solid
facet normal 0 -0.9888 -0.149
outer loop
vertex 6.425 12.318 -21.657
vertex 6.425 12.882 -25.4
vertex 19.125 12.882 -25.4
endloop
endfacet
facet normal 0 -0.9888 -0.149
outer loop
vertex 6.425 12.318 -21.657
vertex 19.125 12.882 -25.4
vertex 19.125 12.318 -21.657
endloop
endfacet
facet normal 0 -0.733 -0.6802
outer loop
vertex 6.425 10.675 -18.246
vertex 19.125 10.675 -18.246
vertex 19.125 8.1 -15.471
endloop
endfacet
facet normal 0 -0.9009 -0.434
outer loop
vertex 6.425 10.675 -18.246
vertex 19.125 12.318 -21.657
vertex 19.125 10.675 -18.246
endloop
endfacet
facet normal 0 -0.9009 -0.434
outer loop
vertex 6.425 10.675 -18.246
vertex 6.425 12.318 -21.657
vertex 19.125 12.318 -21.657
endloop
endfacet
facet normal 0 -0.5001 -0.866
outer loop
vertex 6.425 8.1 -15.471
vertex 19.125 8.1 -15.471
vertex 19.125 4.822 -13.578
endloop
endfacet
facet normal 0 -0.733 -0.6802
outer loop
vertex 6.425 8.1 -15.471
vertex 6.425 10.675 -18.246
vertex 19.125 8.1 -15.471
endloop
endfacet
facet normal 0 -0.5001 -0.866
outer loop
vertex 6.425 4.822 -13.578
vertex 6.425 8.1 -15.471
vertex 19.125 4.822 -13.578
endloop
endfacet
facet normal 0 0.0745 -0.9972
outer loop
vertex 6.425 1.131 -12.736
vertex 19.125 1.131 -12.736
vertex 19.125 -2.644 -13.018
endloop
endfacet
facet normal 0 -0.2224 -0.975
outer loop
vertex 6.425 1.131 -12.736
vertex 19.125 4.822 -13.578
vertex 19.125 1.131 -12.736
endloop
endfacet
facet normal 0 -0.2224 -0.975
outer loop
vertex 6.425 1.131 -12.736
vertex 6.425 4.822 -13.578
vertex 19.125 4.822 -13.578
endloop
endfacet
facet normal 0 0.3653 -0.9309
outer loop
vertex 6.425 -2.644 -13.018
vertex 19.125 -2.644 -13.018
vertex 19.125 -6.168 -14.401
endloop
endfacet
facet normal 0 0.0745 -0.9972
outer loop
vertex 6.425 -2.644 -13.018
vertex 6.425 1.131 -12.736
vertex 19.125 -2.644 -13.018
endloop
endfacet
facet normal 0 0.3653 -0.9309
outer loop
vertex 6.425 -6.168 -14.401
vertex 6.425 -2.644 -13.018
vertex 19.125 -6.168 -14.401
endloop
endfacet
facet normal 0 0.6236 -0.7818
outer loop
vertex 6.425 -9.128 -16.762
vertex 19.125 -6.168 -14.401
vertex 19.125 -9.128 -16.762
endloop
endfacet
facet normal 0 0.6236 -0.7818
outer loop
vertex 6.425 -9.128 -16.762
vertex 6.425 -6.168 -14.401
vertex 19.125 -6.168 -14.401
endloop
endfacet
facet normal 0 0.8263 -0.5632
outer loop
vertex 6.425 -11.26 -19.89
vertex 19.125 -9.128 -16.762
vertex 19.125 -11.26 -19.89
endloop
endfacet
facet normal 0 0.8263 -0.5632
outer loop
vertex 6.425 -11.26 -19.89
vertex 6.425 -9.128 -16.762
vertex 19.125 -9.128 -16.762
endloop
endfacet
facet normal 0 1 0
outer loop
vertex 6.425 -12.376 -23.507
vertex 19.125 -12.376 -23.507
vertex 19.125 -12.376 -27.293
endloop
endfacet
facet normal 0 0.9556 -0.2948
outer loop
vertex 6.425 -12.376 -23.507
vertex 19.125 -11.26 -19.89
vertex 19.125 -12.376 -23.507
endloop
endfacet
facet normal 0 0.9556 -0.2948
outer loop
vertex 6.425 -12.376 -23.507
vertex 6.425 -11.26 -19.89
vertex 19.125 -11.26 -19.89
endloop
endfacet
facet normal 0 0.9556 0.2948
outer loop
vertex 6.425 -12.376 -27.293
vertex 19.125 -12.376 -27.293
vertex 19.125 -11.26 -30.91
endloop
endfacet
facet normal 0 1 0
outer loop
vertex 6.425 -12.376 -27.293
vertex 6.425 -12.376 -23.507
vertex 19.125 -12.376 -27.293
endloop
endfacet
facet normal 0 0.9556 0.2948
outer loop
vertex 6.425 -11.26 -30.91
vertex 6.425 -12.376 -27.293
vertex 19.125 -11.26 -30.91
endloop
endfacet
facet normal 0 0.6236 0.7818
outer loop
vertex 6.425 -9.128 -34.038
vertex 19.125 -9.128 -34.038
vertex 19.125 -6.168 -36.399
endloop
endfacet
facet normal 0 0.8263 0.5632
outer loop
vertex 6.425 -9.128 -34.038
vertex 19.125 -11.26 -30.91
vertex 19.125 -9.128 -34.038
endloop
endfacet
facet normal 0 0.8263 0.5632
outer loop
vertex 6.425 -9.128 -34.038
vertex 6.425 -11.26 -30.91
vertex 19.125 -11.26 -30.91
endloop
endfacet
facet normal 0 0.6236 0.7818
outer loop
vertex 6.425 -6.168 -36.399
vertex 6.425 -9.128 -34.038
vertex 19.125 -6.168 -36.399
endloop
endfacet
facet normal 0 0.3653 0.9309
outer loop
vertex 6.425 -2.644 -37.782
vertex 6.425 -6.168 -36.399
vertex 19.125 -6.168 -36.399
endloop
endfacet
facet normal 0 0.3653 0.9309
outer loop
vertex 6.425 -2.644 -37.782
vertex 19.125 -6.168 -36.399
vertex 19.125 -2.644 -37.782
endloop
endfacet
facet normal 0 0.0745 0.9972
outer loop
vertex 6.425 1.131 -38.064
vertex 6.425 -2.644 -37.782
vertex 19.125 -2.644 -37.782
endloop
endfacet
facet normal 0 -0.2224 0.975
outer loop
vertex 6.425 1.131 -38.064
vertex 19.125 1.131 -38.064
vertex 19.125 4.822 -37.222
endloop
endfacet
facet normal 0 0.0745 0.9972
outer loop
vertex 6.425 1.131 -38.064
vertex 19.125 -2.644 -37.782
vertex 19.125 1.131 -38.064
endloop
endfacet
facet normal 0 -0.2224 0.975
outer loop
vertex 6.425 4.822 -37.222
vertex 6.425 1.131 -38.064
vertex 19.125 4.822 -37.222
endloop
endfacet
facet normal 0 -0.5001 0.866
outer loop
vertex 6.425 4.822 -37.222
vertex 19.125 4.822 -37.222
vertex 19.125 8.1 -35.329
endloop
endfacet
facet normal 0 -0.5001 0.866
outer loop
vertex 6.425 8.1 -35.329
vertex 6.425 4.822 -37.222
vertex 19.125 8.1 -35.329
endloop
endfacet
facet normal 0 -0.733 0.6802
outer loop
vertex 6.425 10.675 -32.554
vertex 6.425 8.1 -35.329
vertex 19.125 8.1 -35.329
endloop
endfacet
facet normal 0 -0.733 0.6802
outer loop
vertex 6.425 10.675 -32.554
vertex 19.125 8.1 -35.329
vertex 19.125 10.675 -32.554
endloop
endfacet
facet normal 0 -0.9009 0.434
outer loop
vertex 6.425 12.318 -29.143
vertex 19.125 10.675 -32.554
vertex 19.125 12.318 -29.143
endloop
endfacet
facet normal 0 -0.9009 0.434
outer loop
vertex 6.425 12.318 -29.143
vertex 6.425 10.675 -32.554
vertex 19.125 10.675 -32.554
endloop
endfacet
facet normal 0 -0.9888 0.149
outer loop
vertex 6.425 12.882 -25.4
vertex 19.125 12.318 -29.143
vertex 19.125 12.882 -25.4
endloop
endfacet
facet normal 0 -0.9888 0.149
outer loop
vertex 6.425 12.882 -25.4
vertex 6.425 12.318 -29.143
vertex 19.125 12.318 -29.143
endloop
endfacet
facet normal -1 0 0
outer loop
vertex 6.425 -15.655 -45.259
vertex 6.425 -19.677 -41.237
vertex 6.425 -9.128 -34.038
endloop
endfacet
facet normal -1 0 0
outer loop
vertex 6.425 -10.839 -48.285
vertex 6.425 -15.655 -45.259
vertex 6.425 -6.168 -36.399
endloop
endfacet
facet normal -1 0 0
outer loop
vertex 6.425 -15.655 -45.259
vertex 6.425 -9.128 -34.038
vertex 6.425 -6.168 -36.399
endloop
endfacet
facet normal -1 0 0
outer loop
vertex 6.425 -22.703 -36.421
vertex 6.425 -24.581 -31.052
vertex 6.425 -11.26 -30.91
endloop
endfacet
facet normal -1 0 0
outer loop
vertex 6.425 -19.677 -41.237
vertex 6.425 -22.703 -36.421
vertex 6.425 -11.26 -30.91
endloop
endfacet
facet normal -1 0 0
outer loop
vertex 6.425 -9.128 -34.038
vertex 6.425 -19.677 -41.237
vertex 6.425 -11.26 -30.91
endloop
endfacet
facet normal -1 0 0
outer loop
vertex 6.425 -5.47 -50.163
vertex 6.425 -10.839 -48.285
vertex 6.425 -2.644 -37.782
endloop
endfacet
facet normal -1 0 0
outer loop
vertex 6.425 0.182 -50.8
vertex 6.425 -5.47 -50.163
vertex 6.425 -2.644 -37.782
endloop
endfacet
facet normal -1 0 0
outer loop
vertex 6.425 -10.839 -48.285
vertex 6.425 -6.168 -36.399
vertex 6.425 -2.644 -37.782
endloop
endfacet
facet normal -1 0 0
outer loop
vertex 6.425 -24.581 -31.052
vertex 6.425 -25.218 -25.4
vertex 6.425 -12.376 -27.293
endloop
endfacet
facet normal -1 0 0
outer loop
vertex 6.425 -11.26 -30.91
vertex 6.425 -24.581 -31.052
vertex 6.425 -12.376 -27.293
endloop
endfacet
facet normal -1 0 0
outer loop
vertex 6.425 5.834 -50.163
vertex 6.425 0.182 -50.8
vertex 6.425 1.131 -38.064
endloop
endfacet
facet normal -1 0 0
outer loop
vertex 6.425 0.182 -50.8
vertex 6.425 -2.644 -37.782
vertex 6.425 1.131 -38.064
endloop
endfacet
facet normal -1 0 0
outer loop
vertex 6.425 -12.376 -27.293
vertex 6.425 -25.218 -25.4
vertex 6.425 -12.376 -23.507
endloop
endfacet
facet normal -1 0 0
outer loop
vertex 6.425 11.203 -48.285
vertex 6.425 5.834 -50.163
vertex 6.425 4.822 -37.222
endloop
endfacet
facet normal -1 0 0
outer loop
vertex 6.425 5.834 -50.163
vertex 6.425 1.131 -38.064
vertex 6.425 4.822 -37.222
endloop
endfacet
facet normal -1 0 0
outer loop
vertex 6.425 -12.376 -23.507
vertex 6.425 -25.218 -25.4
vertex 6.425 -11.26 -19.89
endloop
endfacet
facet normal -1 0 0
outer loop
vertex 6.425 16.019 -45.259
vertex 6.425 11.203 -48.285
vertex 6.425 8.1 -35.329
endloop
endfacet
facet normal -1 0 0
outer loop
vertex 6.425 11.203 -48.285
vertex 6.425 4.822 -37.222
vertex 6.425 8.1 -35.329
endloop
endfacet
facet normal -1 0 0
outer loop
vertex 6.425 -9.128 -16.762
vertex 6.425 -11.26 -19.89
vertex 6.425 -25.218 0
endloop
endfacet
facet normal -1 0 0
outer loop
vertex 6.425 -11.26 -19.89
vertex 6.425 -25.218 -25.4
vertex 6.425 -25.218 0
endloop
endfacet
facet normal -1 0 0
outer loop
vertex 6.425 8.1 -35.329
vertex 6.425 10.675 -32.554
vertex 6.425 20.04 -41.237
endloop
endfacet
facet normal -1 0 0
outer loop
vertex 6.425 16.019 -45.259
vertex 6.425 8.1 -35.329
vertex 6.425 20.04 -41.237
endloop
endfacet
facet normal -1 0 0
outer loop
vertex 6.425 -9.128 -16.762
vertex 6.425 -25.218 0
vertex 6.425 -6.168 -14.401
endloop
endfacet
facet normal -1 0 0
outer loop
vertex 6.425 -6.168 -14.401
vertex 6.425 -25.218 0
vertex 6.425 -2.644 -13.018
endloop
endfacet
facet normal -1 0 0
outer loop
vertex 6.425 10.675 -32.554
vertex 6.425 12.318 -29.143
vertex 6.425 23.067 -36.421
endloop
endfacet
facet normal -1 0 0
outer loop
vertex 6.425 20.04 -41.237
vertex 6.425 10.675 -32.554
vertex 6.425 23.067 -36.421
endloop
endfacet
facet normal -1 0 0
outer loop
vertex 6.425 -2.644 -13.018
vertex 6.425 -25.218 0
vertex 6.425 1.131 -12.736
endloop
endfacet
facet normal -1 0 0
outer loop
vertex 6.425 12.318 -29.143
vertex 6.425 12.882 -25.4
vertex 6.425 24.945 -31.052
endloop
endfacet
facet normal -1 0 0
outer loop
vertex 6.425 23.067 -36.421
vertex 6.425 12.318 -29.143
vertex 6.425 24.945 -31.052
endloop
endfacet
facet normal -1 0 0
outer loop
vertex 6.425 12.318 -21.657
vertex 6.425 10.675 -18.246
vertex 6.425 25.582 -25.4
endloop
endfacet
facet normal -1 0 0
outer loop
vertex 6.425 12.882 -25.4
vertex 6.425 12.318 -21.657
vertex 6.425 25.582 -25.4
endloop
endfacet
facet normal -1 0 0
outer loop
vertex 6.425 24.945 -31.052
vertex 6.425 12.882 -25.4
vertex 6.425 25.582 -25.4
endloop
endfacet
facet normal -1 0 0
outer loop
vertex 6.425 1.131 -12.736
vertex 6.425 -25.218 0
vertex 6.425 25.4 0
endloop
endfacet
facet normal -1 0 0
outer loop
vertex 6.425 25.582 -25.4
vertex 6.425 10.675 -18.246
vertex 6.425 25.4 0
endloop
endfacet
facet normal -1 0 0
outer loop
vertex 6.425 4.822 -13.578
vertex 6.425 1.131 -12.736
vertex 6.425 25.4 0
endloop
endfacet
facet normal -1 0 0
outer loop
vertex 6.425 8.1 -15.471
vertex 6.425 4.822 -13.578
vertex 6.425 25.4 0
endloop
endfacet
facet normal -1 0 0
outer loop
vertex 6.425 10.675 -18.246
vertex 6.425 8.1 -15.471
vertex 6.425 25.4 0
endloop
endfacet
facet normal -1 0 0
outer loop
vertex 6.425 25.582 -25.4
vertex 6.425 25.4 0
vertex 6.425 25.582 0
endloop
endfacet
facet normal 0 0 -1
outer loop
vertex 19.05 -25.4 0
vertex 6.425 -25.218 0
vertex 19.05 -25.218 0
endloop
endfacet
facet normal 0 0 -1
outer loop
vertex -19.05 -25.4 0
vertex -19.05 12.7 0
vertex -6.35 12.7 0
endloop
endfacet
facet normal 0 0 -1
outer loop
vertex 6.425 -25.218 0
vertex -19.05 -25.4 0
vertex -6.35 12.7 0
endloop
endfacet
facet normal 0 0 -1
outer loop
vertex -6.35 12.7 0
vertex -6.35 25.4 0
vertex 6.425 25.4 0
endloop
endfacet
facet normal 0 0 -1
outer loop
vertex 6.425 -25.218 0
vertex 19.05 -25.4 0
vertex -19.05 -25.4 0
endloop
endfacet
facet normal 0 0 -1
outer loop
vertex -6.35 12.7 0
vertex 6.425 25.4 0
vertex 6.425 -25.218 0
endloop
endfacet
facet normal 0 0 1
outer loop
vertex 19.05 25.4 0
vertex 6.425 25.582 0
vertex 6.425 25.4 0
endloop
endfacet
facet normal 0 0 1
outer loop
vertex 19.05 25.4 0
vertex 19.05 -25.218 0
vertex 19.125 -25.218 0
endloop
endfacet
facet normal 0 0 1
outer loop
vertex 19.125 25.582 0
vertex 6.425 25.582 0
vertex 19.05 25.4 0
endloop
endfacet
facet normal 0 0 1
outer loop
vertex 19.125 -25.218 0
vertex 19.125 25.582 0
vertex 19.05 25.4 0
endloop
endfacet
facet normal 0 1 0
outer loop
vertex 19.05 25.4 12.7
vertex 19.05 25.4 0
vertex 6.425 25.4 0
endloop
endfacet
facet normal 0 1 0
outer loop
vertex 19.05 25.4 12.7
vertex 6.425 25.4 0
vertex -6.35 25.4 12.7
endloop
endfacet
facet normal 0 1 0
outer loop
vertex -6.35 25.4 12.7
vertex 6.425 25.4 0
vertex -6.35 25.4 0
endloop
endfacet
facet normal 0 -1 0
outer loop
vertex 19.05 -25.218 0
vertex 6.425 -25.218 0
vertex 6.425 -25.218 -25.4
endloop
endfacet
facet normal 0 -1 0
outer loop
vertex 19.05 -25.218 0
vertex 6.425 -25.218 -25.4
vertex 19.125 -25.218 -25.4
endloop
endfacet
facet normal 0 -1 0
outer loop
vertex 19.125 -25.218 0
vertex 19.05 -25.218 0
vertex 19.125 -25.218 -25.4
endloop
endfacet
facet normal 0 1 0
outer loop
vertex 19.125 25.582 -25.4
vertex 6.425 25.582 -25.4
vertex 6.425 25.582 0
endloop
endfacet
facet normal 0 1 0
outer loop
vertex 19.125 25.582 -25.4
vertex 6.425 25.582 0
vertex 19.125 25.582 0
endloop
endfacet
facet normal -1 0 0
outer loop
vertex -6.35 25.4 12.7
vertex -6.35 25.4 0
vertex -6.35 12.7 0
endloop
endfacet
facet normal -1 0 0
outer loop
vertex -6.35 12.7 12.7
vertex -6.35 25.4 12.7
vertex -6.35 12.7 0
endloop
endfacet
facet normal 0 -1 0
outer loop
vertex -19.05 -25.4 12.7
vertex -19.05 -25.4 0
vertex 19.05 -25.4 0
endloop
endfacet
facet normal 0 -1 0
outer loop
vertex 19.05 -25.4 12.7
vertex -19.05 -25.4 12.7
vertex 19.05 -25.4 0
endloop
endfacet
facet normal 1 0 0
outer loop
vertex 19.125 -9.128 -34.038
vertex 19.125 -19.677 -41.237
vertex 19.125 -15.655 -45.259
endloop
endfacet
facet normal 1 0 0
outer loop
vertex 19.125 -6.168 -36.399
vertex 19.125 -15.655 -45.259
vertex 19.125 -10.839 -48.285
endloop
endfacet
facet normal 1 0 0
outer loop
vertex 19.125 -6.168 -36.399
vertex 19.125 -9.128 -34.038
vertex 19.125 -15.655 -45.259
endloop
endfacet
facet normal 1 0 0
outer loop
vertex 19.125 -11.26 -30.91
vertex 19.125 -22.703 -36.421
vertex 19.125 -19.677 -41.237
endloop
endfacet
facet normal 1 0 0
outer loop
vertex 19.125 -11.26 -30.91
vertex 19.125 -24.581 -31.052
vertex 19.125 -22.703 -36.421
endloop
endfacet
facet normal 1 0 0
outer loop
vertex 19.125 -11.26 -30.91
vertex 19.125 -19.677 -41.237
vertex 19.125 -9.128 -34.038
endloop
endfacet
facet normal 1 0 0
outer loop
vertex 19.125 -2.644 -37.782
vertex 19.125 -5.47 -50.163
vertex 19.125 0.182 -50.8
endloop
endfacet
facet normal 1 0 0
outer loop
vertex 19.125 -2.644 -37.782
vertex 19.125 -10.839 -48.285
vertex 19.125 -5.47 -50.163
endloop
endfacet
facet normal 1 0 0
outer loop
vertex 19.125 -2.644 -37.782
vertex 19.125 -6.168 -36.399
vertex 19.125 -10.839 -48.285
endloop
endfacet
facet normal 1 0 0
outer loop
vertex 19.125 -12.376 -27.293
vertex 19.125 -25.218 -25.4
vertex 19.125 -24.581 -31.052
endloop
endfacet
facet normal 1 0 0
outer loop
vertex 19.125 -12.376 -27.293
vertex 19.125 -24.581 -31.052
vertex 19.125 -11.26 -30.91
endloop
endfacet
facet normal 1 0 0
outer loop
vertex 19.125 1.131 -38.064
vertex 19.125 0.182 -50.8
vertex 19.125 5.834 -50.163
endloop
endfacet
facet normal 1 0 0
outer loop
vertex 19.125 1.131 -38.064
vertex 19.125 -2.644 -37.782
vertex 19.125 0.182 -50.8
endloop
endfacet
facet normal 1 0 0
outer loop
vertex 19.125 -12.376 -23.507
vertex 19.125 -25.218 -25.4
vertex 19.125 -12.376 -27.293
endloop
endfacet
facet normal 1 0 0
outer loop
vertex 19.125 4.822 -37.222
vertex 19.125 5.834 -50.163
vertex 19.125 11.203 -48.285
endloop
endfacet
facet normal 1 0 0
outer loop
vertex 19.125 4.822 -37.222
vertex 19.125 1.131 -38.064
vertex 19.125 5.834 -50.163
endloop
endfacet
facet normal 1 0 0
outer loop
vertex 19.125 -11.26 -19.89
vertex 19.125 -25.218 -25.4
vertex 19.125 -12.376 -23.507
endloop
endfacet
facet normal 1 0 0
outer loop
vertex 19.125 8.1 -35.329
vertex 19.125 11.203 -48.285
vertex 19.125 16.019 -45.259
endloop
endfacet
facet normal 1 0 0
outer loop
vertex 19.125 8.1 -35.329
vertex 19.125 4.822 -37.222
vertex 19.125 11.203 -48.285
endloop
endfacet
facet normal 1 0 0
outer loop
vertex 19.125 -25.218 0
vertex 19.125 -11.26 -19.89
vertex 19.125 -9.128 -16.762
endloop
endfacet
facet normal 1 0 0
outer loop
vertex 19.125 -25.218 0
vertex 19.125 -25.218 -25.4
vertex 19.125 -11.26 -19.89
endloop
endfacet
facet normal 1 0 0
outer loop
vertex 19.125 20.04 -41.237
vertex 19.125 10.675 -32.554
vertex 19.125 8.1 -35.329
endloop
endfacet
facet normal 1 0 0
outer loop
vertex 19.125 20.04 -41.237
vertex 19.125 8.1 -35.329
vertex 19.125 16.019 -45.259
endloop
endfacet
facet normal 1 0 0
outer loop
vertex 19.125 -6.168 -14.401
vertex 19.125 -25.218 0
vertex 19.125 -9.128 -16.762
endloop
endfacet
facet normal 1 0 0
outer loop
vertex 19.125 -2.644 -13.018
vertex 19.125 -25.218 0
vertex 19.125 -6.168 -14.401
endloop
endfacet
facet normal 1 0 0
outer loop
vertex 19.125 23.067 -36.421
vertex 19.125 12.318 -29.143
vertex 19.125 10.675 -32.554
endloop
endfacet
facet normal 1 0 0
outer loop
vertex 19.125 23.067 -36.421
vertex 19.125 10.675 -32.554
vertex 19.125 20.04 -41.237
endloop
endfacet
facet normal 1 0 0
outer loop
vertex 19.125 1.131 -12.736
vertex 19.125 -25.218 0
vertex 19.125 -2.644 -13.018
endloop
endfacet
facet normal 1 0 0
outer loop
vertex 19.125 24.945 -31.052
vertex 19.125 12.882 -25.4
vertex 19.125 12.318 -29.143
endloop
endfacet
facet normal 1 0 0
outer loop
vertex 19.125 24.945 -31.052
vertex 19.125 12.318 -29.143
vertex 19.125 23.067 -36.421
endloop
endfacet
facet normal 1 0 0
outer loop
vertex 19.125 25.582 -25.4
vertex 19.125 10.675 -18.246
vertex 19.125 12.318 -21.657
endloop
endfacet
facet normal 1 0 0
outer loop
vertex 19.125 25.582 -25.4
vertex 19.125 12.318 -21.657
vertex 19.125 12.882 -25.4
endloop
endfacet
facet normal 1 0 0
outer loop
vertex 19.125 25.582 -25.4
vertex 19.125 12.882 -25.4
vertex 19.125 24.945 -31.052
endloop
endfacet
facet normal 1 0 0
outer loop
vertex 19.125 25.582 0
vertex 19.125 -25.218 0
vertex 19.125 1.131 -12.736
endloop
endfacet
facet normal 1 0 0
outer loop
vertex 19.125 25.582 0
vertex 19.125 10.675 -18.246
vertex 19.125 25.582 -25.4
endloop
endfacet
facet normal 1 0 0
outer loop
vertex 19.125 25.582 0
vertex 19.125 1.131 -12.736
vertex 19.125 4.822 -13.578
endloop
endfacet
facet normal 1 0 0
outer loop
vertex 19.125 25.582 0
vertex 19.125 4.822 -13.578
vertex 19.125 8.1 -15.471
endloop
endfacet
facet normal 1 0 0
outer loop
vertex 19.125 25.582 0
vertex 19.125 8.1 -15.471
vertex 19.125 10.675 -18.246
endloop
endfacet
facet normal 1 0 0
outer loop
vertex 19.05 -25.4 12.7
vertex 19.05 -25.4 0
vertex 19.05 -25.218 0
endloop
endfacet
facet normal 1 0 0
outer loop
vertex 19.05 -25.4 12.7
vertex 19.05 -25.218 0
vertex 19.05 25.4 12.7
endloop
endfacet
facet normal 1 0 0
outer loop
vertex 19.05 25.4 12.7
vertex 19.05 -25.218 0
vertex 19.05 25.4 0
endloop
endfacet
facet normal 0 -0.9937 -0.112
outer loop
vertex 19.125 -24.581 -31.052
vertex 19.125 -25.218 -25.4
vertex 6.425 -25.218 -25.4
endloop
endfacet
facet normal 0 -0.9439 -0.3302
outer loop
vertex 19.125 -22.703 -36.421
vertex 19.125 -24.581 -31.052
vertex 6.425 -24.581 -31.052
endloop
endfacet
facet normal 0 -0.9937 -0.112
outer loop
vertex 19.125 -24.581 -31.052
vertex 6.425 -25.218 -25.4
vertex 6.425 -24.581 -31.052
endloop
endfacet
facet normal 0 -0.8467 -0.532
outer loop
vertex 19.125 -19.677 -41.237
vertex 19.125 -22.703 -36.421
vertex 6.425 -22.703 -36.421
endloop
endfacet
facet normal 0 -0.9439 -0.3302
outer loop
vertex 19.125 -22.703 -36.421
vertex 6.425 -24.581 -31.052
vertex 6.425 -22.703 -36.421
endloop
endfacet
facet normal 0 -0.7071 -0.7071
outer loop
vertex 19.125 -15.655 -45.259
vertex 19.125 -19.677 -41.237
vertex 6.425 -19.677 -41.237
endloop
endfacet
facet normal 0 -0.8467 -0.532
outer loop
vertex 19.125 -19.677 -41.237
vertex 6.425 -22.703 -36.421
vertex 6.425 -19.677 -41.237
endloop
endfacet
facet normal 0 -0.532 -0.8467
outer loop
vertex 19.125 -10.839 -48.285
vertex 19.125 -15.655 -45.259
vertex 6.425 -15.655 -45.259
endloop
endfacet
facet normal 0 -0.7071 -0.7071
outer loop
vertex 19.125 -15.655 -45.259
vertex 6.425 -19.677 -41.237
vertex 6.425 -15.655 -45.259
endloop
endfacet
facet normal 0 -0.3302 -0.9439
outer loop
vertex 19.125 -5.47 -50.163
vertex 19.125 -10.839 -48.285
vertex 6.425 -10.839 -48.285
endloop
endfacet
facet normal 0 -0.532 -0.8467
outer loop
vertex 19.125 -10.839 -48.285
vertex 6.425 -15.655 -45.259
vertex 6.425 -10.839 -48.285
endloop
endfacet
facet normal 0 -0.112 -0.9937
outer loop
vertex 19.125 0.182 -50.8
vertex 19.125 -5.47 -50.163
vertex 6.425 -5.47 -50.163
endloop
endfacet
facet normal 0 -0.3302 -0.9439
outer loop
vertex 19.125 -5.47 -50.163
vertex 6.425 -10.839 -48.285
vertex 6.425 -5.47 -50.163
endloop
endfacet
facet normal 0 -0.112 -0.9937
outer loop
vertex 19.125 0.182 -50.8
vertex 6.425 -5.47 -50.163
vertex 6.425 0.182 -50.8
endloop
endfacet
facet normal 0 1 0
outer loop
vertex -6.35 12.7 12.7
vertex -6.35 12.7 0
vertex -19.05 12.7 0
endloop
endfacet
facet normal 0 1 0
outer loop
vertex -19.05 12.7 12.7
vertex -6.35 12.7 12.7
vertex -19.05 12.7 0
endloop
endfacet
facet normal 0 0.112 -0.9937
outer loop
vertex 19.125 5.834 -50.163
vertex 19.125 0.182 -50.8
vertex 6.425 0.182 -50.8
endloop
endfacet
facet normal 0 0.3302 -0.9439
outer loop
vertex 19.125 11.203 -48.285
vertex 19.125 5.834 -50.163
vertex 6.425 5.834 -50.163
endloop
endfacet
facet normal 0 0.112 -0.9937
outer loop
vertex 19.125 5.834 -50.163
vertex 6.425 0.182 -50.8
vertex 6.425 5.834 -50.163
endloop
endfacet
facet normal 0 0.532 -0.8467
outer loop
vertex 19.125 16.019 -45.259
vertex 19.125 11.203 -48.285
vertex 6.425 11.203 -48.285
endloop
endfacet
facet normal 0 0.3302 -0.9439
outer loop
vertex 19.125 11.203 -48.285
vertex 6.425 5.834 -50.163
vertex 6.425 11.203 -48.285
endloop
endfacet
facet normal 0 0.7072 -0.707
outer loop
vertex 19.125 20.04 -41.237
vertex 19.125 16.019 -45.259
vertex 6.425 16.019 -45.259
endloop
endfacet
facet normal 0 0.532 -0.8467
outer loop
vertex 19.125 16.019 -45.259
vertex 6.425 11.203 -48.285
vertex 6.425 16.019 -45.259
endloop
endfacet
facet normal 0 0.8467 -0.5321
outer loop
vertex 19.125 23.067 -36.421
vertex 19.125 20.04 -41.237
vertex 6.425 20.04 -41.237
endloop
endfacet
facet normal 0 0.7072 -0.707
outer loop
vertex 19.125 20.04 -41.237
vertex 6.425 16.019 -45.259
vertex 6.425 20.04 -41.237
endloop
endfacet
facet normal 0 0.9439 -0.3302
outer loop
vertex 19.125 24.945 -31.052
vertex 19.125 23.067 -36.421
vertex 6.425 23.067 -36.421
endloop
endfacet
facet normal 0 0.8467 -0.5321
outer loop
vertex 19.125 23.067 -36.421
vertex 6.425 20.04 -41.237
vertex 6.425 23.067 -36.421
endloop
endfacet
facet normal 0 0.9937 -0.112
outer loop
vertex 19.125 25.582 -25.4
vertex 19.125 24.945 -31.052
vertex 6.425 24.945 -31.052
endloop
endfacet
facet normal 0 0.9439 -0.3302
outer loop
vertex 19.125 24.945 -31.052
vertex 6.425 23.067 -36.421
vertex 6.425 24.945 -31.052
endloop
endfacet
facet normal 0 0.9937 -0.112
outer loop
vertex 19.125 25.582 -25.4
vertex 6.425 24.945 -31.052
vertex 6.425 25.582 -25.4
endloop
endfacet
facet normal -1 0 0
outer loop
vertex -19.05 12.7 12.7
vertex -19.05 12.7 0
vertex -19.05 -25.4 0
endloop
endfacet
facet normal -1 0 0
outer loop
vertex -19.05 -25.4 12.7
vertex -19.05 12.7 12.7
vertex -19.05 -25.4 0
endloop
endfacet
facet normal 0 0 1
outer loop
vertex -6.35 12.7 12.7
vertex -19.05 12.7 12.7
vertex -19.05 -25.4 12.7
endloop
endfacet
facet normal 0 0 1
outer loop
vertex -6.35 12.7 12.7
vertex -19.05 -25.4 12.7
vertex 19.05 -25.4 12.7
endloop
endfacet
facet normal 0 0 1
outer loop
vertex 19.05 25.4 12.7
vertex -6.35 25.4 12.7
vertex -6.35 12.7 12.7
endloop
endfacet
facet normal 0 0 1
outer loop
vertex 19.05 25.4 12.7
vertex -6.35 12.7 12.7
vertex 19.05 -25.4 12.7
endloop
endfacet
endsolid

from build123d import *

# Parameters (mm, degrees)
F1_DEPTH = 12.7
F2_W     = 12.7
F2_H     = 50.8
F3_DEPTH = 50.8
F4_R     = 12.7
F5_DEPTH = 21.59
F7_DEPTH = 25.4


with BuildPart() as f1:
    # F0 (on Top) → F1 (new body)
    with BuildSketch(Plane.XY):
        Polygon((19.05, -25.4), (19.05, 25.4), (-6.35, 25.4), (-6.35, 12.7), (-19.05, 12.7), (-19.05, -25.4), align=None)
    extrude(amount=F1_DEPTH)

    # F2 (on Top) → F3 (join)
    with BuildSketch(Plane.XY):
        with Locations((12.775489, 0.181956)):
            Rectangle(F2_W, F2_H)
    extrude(amount=-F3_DEPTH)

    # F4 (on Right) → F5 (cut)
    with BuildSketch(Plane.YZ):
        with Locations((0.181956, -25.4)):
            Circle(F4_R)
    extrude(amount=F5_DEPTH, mode=Mode.SUBTRACT)

    # F6 (on face) → F7 (cut)
    with BuildSketch(Plane(origin=(6.425489, 0, 0), x_dir=(0, -1, 0), z_dir=(-1, 0, 0))):
        with BuildLine():
            ThreePointArc((25.218044, -25.4), (17.778556, -43.360512), (-0.181956, -50.8))
            Line((-0.181956, -50.8), (25.218044, -50.8))
            Line((25.218044, -50.8), (25.218044, -25.4))
        make_face()
        with BuildLine():
            ThreePointArc((-0.181956, -50.8), (-18.142468, -43.360512), (-25.581956, -25.4))
            Line((-25.581956, -25.4), (-25.581956, -50.8))
            Line((-25.581956, -50.8), (-0.181956, -50.8))
        make_face()
    extrude(amount=-F7_DEPTH, mode=Mode.SUBTRACT)


solid = f1.part
